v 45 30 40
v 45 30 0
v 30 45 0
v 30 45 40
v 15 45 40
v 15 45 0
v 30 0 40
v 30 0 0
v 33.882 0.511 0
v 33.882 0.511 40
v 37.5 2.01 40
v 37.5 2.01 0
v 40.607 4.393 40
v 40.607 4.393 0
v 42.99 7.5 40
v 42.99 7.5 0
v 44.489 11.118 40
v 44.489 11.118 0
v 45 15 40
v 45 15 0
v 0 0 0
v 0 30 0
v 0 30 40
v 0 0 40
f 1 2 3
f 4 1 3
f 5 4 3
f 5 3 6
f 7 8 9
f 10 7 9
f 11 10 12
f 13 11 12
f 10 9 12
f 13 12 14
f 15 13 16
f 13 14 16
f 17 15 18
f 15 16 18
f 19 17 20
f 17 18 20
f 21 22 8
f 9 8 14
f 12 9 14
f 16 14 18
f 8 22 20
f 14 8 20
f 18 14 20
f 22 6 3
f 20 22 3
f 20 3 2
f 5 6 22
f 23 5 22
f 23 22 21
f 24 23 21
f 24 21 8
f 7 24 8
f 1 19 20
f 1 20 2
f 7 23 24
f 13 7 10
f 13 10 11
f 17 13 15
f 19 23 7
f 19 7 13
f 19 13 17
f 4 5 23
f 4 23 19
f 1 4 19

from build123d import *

# Parameters (mm, degrees)
F1_DEPTH = 40


with BuildPart() as f1:
    # F0 (on Top) → F1 (new body)
    with BuildSketch(Plane.XY):
        with BuildLine():
            Line((0, 30), (0, 0))
            Line((0, 0), (30, 0))
            ThreePointArc((30, 0), (40.606601, 4.393399), (44.999999, 15))
            Line((44.999999, 15), (44.999999, 30))
            Line((44.999999, 30), (29.999999, 44.999999))
            Line((29.999999, 44.999999), (14.999999, 44.999999))
            Line((14.999999, 44.999999), (0, 30))
        make_face()
    extrude(amount=F1_DEPTH)


solid = f1.part
